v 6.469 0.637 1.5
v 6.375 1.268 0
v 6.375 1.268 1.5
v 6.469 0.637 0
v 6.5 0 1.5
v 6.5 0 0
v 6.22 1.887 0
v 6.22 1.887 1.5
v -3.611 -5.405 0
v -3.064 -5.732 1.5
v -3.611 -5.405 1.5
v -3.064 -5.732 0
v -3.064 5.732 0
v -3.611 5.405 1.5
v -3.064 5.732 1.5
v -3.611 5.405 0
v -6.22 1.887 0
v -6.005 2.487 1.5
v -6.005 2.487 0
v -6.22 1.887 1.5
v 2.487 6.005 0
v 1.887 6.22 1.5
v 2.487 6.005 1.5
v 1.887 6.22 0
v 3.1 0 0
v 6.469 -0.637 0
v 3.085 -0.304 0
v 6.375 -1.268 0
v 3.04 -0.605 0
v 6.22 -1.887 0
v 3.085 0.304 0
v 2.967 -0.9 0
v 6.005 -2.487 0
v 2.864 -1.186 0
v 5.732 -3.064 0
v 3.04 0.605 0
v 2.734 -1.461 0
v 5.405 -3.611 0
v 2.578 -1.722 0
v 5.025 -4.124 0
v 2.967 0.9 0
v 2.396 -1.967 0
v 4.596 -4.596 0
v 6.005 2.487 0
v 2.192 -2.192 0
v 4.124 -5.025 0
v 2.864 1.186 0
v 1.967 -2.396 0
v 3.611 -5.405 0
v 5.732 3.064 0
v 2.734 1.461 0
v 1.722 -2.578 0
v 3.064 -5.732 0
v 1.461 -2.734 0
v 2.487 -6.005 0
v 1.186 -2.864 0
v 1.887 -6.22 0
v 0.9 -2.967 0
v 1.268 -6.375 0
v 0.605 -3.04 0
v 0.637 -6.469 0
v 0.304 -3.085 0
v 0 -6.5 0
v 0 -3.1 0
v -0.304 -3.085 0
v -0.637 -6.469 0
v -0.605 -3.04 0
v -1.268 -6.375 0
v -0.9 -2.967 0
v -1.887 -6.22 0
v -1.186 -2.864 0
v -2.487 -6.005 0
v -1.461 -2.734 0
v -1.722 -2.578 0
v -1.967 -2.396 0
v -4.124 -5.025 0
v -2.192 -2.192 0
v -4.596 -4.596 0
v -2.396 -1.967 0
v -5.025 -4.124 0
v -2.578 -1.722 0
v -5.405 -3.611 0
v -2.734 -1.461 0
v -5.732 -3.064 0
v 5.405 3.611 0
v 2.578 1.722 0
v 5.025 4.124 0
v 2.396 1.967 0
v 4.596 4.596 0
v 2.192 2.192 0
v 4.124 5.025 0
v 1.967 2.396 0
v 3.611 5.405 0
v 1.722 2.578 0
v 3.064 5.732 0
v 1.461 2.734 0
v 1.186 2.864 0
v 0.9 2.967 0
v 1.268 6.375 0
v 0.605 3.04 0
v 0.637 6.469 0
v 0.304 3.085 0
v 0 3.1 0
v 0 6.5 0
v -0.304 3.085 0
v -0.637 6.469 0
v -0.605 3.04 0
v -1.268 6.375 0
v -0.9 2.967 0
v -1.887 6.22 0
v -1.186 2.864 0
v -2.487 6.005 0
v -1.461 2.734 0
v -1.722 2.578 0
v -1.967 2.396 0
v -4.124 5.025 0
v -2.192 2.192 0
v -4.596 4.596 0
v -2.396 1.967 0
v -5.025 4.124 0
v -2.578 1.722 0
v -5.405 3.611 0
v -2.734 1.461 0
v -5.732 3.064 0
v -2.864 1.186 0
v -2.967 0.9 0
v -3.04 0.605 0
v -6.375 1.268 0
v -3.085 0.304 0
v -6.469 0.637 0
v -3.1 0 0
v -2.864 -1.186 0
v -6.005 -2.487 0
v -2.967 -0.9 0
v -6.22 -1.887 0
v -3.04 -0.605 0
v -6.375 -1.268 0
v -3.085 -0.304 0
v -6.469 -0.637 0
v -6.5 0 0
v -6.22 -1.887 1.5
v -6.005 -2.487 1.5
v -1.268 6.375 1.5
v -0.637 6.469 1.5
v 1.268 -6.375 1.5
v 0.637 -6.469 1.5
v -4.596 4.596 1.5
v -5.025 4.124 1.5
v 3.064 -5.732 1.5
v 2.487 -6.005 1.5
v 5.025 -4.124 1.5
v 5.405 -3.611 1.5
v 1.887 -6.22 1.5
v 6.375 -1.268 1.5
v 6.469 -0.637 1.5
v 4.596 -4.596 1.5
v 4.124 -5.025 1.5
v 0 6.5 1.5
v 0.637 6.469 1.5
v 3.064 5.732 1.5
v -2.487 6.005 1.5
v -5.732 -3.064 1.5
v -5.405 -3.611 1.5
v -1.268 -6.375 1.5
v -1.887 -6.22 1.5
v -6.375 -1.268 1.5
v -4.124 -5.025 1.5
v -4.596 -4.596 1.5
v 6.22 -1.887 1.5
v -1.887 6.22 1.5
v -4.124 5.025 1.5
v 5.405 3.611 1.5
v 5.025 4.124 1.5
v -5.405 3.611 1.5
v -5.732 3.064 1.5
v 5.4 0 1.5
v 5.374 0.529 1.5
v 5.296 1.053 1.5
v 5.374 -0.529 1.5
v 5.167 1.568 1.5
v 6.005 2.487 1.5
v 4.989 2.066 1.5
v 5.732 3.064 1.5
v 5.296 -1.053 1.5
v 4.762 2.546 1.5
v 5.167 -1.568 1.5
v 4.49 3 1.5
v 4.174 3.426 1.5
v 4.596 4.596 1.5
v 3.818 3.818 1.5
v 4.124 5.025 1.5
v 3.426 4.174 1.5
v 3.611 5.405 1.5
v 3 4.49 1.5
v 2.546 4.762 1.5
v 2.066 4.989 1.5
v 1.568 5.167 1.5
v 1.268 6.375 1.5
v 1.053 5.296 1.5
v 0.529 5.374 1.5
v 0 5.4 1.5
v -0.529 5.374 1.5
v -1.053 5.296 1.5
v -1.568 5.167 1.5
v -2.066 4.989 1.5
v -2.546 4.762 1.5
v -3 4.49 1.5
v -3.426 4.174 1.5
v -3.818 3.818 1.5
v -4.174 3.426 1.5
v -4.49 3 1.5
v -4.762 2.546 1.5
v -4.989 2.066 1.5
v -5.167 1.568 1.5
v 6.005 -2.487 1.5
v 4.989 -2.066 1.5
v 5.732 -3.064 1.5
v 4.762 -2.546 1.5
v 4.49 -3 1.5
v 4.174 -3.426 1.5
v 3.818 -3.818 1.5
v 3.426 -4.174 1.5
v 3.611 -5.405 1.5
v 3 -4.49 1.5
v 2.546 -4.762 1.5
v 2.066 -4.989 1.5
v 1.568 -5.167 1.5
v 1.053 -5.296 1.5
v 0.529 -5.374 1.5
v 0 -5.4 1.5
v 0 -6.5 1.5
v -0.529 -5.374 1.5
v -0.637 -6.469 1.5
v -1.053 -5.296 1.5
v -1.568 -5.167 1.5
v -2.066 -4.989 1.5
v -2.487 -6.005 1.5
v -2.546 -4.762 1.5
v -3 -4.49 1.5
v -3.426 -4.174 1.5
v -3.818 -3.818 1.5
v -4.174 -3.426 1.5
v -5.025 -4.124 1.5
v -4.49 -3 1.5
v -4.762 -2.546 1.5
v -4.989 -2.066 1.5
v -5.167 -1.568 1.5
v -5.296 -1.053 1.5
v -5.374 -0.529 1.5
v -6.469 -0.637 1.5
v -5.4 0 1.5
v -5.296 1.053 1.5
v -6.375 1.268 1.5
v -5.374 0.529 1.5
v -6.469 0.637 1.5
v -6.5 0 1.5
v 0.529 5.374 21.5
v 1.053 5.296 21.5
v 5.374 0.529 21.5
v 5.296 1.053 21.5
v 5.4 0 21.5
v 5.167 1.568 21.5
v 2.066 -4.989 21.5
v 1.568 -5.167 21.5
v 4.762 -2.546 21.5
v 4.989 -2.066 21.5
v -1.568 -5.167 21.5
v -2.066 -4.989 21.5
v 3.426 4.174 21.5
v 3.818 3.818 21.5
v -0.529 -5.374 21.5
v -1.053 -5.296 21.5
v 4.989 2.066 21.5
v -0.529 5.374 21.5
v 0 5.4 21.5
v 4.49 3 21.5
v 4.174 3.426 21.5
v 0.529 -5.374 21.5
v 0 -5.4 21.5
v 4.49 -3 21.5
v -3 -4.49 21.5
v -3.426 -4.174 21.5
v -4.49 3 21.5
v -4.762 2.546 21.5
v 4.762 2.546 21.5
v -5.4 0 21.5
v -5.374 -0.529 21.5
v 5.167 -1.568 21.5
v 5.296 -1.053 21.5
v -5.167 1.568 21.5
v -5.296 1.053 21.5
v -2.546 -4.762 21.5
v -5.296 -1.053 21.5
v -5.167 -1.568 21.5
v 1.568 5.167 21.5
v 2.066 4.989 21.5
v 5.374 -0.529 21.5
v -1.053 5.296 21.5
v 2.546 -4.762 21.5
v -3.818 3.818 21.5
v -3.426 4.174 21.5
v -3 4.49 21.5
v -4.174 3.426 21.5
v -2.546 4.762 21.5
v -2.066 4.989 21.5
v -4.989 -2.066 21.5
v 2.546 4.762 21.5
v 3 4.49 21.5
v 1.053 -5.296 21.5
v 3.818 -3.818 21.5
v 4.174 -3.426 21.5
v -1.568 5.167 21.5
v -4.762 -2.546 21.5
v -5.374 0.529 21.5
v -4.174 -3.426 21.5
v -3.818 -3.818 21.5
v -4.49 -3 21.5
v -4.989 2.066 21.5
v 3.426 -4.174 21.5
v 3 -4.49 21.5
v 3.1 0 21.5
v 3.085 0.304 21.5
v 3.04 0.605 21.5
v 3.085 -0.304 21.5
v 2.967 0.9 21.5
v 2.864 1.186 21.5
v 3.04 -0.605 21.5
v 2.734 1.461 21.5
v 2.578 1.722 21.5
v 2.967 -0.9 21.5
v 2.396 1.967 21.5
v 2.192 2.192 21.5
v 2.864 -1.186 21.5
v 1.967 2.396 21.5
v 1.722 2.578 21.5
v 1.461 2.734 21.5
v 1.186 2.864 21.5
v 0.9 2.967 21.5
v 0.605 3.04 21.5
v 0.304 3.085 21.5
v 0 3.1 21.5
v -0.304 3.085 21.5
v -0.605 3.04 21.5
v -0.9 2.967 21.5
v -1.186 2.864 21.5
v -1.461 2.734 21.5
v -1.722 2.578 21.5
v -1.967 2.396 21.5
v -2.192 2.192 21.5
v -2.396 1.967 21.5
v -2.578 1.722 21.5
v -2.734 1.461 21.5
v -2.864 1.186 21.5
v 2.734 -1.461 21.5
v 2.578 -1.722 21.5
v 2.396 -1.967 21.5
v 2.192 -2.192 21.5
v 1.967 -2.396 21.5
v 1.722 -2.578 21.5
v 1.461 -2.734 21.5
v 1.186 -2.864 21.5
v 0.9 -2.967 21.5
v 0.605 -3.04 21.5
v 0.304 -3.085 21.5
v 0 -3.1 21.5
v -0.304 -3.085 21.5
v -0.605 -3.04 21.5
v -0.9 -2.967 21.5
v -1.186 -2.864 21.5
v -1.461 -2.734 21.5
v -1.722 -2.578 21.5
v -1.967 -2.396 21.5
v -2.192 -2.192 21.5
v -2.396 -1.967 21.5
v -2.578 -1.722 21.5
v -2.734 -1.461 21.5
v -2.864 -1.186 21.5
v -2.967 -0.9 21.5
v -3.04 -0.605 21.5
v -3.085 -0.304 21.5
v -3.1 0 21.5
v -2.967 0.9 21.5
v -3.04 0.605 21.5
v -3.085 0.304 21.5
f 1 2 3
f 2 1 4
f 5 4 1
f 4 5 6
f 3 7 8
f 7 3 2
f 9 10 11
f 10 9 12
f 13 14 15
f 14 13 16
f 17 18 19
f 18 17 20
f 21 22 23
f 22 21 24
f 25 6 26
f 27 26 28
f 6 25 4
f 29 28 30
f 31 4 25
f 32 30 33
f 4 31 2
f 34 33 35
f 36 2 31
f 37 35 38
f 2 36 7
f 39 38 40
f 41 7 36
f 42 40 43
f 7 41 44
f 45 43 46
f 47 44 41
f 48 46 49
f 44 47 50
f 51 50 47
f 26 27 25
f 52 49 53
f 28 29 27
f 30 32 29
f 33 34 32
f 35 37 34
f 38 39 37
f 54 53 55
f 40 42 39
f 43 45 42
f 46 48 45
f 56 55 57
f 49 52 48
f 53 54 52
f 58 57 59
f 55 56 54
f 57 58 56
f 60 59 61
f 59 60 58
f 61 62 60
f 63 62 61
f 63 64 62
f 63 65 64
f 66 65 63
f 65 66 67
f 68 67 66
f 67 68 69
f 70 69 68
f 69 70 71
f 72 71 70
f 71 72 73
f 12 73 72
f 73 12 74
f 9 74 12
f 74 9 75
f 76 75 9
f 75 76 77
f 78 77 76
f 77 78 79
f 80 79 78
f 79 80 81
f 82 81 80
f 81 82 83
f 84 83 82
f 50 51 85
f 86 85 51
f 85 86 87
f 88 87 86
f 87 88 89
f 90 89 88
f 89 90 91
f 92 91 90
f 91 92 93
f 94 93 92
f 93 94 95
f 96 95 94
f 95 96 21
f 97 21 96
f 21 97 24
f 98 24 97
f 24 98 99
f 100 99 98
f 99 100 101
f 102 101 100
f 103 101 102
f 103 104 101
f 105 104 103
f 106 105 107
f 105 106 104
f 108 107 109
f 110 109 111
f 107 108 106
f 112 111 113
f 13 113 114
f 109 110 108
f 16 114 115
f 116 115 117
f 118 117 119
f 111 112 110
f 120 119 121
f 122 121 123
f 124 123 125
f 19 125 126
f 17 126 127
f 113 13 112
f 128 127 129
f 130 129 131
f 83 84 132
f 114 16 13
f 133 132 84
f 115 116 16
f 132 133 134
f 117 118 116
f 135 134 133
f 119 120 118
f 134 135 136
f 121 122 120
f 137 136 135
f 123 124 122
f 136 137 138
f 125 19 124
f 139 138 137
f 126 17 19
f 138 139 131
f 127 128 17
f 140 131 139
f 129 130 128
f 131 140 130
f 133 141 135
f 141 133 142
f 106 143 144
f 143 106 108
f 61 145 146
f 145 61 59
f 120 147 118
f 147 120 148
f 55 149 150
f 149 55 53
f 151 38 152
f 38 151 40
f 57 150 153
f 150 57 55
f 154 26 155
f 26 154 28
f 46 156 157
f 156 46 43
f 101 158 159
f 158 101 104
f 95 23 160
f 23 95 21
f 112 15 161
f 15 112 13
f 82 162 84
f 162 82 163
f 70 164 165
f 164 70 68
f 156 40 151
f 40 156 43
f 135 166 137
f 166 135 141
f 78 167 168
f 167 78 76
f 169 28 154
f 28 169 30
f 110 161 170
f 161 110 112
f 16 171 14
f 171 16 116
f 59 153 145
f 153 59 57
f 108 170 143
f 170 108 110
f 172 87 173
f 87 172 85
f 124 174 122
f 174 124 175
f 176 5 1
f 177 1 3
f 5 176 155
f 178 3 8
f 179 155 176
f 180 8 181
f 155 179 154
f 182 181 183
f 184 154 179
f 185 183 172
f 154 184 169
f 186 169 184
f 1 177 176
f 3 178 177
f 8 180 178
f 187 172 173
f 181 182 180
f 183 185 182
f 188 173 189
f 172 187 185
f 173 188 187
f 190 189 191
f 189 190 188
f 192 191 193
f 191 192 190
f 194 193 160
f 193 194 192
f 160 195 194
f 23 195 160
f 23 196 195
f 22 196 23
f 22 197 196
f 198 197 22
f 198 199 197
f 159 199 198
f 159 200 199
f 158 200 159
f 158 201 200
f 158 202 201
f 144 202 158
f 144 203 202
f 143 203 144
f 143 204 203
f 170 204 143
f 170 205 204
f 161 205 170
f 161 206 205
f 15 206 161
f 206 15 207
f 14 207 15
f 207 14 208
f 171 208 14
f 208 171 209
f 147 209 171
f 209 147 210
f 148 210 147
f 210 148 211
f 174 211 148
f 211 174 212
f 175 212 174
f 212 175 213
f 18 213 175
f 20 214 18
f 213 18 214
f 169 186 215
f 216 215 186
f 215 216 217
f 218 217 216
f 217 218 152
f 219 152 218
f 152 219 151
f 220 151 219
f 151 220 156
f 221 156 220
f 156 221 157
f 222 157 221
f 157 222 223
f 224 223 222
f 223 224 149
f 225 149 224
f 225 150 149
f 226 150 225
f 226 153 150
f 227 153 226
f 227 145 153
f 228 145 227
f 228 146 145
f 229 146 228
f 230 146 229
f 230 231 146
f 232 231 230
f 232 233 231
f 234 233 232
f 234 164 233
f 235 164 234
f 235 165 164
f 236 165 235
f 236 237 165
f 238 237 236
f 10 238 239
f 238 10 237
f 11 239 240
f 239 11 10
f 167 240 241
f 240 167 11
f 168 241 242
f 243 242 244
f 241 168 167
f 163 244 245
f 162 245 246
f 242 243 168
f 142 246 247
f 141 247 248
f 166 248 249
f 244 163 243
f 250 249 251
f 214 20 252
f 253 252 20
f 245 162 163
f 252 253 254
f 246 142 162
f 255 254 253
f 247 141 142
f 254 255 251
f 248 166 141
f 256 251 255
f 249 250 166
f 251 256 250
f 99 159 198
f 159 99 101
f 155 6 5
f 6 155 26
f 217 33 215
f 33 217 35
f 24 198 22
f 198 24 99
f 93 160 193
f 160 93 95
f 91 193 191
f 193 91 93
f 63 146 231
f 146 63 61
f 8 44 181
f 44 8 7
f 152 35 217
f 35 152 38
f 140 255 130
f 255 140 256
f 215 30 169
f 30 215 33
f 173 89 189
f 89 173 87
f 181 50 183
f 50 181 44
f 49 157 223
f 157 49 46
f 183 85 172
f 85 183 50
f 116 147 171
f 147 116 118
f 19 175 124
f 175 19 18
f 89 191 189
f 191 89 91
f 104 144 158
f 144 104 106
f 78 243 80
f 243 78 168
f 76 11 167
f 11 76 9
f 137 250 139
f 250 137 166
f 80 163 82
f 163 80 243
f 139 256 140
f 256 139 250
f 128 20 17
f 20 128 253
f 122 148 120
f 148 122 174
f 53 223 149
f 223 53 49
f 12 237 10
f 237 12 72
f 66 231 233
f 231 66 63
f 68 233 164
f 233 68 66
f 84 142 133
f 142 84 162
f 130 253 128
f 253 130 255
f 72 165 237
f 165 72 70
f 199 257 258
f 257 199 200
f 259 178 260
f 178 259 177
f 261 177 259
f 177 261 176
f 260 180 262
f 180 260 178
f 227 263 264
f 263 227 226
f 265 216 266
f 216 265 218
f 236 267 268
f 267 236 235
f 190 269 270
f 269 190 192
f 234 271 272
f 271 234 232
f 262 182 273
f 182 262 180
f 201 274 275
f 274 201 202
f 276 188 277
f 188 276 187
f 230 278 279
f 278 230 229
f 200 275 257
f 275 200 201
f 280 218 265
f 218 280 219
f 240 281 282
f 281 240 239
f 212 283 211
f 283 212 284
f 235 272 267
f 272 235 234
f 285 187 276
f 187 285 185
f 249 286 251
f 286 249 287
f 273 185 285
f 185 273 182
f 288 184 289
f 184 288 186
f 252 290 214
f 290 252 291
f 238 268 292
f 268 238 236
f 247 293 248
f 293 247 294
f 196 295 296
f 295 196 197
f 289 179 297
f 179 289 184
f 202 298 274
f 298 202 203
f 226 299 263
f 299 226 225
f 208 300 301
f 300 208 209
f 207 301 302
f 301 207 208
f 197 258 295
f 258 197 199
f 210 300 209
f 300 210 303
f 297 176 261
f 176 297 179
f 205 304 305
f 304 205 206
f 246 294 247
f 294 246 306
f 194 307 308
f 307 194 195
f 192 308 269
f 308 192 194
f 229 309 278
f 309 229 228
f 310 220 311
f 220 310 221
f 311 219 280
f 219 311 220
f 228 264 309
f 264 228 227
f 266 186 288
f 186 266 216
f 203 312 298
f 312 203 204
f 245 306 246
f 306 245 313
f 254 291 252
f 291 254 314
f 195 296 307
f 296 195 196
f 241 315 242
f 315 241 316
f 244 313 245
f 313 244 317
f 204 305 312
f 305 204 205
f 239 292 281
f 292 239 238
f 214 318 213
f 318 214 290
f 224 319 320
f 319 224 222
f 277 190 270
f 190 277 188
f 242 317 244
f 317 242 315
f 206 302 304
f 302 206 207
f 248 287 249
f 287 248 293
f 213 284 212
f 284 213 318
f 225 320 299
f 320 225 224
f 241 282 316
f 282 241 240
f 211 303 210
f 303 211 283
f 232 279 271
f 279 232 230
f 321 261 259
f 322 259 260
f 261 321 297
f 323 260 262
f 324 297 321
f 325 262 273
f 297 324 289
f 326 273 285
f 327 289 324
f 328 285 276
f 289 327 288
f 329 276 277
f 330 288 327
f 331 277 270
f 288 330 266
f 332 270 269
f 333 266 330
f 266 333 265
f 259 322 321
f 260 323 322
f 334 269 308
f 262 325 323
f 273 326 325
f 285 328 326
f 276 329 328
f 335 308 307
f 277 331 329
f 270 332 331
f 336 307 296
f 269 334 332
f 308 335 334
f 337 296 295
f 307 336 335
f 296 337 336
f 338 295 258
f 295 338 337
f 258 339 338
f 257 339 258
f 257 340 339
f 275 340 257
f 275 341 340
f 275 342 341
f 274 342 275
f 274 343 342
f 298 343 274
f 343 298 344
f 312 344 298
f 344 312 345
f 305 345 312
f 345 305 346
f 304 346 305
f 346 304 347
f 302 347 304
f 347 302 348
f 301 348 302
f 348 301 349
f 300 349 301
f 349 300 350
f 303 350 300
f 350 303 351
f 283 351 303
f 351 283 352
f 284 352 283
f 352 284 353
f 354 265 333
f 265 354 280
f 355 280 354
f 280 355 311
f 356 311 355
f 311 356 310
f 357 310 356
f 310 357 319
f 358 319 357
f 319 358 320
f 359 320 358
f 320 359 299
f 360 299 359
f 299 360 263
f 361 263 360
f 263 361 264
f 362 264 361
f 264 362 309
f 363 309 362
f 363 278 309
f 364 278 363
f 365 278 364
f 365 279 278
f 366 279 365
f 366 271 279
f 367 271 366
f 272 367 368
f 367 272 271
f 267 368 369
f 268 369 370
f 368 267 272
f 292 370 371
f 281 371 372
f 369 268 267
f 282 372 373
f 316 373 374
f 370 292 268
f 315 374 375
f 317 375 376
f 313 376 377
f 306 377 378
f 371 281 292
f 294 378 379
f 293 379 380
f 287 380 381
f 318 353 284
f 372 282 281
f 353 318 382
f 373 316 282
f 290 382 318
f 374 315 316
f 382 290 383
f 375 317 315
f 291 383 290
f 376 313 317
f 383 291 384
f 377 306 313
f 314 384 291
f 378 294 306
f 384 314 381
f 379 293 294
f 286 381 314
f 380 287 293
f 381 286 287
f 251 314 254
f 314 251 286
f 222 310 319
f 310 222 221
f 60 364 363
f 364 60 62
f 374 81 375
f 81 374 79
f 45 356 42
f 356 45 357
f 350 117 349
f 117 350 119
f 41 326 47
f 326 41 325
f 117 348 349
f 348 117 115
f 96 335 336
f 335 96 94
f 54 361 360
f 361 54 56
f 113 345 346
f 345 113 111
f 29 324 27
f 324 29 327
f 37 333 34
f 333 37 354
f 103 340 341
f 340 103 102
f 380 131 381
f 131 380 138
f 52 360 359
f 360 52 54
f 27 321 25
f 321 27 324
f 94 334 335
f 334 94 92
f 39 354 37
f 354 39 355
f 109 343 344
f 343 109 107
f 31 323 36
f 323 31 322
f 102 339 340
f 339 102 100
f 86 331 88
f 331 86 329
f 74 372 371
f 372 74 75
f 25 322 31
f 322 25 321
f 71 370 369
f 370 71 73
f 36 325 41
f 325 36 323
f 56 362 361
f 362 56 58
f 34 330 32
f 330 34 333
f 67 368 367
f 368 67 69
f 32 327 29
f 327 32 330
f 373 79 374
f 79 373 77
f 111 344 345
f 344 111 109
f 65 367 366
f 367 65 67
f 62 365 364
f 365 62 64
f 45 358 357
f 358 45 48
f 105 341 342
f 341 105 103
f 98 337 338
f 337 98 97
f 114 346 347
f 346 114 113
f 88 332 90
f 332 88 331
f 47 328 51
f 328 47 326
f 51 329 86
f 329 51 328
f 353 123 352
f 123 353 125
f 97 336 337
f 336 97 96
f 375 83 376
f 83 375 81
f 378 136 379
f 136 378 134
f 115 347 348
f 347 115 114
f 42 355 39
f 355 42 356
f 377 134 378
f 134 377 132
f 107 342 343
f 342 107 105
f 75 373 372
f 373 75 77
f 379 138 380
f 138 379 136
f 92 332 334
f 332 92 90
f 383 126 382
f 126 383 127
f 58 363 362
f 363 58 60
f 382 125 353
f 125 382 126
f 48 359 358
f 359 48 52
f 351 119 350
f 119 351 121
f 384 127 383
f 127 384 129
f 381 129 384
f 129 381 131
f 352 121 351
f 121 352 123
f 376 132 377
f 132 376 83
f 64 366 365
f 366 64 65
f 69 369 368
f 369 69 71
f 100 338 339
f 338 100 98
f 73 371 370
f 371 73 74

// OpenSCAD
// Adapter sleeve: 0.2 mL PCR tube in a 1.5 mL rack hole
// Print orientation: collar down on the bed (z = 0), sleeve up (+Z)

$fn = 64;

// ---- Dimensions (mm) ----
collar_d      = 13;    // collar outer diameter
collar_h      = 1.5;   // collar thickness (z = 0 to 1.5)
sleeve_od     = 10.8;  // sleeve body outer diameter
sleeve_top_z  = 21.5;  // top of sleeve body
bore_d        = 6.2;   // through-bore diameter
eps           = 0.5;   // cutter overshoot past faces

// ---- Model ----
difference() {
    union() {
        // Collar
        cylinder(d = collar_d, h = collar_h);
        // Sleeve body, overlapping slightly into the collar for a clean union
        translate([0, 0, collar_h - 0.01])
            cylinder(d = sleeve_od, h = sleeve_top_z - collar_h + 0.01);
    }
    // Full-height bore, open at both ends
    translate([0, 0, -eps])
        cylinder(d = bore_d, h = sleeve_top_z + 2 * eps);
}
